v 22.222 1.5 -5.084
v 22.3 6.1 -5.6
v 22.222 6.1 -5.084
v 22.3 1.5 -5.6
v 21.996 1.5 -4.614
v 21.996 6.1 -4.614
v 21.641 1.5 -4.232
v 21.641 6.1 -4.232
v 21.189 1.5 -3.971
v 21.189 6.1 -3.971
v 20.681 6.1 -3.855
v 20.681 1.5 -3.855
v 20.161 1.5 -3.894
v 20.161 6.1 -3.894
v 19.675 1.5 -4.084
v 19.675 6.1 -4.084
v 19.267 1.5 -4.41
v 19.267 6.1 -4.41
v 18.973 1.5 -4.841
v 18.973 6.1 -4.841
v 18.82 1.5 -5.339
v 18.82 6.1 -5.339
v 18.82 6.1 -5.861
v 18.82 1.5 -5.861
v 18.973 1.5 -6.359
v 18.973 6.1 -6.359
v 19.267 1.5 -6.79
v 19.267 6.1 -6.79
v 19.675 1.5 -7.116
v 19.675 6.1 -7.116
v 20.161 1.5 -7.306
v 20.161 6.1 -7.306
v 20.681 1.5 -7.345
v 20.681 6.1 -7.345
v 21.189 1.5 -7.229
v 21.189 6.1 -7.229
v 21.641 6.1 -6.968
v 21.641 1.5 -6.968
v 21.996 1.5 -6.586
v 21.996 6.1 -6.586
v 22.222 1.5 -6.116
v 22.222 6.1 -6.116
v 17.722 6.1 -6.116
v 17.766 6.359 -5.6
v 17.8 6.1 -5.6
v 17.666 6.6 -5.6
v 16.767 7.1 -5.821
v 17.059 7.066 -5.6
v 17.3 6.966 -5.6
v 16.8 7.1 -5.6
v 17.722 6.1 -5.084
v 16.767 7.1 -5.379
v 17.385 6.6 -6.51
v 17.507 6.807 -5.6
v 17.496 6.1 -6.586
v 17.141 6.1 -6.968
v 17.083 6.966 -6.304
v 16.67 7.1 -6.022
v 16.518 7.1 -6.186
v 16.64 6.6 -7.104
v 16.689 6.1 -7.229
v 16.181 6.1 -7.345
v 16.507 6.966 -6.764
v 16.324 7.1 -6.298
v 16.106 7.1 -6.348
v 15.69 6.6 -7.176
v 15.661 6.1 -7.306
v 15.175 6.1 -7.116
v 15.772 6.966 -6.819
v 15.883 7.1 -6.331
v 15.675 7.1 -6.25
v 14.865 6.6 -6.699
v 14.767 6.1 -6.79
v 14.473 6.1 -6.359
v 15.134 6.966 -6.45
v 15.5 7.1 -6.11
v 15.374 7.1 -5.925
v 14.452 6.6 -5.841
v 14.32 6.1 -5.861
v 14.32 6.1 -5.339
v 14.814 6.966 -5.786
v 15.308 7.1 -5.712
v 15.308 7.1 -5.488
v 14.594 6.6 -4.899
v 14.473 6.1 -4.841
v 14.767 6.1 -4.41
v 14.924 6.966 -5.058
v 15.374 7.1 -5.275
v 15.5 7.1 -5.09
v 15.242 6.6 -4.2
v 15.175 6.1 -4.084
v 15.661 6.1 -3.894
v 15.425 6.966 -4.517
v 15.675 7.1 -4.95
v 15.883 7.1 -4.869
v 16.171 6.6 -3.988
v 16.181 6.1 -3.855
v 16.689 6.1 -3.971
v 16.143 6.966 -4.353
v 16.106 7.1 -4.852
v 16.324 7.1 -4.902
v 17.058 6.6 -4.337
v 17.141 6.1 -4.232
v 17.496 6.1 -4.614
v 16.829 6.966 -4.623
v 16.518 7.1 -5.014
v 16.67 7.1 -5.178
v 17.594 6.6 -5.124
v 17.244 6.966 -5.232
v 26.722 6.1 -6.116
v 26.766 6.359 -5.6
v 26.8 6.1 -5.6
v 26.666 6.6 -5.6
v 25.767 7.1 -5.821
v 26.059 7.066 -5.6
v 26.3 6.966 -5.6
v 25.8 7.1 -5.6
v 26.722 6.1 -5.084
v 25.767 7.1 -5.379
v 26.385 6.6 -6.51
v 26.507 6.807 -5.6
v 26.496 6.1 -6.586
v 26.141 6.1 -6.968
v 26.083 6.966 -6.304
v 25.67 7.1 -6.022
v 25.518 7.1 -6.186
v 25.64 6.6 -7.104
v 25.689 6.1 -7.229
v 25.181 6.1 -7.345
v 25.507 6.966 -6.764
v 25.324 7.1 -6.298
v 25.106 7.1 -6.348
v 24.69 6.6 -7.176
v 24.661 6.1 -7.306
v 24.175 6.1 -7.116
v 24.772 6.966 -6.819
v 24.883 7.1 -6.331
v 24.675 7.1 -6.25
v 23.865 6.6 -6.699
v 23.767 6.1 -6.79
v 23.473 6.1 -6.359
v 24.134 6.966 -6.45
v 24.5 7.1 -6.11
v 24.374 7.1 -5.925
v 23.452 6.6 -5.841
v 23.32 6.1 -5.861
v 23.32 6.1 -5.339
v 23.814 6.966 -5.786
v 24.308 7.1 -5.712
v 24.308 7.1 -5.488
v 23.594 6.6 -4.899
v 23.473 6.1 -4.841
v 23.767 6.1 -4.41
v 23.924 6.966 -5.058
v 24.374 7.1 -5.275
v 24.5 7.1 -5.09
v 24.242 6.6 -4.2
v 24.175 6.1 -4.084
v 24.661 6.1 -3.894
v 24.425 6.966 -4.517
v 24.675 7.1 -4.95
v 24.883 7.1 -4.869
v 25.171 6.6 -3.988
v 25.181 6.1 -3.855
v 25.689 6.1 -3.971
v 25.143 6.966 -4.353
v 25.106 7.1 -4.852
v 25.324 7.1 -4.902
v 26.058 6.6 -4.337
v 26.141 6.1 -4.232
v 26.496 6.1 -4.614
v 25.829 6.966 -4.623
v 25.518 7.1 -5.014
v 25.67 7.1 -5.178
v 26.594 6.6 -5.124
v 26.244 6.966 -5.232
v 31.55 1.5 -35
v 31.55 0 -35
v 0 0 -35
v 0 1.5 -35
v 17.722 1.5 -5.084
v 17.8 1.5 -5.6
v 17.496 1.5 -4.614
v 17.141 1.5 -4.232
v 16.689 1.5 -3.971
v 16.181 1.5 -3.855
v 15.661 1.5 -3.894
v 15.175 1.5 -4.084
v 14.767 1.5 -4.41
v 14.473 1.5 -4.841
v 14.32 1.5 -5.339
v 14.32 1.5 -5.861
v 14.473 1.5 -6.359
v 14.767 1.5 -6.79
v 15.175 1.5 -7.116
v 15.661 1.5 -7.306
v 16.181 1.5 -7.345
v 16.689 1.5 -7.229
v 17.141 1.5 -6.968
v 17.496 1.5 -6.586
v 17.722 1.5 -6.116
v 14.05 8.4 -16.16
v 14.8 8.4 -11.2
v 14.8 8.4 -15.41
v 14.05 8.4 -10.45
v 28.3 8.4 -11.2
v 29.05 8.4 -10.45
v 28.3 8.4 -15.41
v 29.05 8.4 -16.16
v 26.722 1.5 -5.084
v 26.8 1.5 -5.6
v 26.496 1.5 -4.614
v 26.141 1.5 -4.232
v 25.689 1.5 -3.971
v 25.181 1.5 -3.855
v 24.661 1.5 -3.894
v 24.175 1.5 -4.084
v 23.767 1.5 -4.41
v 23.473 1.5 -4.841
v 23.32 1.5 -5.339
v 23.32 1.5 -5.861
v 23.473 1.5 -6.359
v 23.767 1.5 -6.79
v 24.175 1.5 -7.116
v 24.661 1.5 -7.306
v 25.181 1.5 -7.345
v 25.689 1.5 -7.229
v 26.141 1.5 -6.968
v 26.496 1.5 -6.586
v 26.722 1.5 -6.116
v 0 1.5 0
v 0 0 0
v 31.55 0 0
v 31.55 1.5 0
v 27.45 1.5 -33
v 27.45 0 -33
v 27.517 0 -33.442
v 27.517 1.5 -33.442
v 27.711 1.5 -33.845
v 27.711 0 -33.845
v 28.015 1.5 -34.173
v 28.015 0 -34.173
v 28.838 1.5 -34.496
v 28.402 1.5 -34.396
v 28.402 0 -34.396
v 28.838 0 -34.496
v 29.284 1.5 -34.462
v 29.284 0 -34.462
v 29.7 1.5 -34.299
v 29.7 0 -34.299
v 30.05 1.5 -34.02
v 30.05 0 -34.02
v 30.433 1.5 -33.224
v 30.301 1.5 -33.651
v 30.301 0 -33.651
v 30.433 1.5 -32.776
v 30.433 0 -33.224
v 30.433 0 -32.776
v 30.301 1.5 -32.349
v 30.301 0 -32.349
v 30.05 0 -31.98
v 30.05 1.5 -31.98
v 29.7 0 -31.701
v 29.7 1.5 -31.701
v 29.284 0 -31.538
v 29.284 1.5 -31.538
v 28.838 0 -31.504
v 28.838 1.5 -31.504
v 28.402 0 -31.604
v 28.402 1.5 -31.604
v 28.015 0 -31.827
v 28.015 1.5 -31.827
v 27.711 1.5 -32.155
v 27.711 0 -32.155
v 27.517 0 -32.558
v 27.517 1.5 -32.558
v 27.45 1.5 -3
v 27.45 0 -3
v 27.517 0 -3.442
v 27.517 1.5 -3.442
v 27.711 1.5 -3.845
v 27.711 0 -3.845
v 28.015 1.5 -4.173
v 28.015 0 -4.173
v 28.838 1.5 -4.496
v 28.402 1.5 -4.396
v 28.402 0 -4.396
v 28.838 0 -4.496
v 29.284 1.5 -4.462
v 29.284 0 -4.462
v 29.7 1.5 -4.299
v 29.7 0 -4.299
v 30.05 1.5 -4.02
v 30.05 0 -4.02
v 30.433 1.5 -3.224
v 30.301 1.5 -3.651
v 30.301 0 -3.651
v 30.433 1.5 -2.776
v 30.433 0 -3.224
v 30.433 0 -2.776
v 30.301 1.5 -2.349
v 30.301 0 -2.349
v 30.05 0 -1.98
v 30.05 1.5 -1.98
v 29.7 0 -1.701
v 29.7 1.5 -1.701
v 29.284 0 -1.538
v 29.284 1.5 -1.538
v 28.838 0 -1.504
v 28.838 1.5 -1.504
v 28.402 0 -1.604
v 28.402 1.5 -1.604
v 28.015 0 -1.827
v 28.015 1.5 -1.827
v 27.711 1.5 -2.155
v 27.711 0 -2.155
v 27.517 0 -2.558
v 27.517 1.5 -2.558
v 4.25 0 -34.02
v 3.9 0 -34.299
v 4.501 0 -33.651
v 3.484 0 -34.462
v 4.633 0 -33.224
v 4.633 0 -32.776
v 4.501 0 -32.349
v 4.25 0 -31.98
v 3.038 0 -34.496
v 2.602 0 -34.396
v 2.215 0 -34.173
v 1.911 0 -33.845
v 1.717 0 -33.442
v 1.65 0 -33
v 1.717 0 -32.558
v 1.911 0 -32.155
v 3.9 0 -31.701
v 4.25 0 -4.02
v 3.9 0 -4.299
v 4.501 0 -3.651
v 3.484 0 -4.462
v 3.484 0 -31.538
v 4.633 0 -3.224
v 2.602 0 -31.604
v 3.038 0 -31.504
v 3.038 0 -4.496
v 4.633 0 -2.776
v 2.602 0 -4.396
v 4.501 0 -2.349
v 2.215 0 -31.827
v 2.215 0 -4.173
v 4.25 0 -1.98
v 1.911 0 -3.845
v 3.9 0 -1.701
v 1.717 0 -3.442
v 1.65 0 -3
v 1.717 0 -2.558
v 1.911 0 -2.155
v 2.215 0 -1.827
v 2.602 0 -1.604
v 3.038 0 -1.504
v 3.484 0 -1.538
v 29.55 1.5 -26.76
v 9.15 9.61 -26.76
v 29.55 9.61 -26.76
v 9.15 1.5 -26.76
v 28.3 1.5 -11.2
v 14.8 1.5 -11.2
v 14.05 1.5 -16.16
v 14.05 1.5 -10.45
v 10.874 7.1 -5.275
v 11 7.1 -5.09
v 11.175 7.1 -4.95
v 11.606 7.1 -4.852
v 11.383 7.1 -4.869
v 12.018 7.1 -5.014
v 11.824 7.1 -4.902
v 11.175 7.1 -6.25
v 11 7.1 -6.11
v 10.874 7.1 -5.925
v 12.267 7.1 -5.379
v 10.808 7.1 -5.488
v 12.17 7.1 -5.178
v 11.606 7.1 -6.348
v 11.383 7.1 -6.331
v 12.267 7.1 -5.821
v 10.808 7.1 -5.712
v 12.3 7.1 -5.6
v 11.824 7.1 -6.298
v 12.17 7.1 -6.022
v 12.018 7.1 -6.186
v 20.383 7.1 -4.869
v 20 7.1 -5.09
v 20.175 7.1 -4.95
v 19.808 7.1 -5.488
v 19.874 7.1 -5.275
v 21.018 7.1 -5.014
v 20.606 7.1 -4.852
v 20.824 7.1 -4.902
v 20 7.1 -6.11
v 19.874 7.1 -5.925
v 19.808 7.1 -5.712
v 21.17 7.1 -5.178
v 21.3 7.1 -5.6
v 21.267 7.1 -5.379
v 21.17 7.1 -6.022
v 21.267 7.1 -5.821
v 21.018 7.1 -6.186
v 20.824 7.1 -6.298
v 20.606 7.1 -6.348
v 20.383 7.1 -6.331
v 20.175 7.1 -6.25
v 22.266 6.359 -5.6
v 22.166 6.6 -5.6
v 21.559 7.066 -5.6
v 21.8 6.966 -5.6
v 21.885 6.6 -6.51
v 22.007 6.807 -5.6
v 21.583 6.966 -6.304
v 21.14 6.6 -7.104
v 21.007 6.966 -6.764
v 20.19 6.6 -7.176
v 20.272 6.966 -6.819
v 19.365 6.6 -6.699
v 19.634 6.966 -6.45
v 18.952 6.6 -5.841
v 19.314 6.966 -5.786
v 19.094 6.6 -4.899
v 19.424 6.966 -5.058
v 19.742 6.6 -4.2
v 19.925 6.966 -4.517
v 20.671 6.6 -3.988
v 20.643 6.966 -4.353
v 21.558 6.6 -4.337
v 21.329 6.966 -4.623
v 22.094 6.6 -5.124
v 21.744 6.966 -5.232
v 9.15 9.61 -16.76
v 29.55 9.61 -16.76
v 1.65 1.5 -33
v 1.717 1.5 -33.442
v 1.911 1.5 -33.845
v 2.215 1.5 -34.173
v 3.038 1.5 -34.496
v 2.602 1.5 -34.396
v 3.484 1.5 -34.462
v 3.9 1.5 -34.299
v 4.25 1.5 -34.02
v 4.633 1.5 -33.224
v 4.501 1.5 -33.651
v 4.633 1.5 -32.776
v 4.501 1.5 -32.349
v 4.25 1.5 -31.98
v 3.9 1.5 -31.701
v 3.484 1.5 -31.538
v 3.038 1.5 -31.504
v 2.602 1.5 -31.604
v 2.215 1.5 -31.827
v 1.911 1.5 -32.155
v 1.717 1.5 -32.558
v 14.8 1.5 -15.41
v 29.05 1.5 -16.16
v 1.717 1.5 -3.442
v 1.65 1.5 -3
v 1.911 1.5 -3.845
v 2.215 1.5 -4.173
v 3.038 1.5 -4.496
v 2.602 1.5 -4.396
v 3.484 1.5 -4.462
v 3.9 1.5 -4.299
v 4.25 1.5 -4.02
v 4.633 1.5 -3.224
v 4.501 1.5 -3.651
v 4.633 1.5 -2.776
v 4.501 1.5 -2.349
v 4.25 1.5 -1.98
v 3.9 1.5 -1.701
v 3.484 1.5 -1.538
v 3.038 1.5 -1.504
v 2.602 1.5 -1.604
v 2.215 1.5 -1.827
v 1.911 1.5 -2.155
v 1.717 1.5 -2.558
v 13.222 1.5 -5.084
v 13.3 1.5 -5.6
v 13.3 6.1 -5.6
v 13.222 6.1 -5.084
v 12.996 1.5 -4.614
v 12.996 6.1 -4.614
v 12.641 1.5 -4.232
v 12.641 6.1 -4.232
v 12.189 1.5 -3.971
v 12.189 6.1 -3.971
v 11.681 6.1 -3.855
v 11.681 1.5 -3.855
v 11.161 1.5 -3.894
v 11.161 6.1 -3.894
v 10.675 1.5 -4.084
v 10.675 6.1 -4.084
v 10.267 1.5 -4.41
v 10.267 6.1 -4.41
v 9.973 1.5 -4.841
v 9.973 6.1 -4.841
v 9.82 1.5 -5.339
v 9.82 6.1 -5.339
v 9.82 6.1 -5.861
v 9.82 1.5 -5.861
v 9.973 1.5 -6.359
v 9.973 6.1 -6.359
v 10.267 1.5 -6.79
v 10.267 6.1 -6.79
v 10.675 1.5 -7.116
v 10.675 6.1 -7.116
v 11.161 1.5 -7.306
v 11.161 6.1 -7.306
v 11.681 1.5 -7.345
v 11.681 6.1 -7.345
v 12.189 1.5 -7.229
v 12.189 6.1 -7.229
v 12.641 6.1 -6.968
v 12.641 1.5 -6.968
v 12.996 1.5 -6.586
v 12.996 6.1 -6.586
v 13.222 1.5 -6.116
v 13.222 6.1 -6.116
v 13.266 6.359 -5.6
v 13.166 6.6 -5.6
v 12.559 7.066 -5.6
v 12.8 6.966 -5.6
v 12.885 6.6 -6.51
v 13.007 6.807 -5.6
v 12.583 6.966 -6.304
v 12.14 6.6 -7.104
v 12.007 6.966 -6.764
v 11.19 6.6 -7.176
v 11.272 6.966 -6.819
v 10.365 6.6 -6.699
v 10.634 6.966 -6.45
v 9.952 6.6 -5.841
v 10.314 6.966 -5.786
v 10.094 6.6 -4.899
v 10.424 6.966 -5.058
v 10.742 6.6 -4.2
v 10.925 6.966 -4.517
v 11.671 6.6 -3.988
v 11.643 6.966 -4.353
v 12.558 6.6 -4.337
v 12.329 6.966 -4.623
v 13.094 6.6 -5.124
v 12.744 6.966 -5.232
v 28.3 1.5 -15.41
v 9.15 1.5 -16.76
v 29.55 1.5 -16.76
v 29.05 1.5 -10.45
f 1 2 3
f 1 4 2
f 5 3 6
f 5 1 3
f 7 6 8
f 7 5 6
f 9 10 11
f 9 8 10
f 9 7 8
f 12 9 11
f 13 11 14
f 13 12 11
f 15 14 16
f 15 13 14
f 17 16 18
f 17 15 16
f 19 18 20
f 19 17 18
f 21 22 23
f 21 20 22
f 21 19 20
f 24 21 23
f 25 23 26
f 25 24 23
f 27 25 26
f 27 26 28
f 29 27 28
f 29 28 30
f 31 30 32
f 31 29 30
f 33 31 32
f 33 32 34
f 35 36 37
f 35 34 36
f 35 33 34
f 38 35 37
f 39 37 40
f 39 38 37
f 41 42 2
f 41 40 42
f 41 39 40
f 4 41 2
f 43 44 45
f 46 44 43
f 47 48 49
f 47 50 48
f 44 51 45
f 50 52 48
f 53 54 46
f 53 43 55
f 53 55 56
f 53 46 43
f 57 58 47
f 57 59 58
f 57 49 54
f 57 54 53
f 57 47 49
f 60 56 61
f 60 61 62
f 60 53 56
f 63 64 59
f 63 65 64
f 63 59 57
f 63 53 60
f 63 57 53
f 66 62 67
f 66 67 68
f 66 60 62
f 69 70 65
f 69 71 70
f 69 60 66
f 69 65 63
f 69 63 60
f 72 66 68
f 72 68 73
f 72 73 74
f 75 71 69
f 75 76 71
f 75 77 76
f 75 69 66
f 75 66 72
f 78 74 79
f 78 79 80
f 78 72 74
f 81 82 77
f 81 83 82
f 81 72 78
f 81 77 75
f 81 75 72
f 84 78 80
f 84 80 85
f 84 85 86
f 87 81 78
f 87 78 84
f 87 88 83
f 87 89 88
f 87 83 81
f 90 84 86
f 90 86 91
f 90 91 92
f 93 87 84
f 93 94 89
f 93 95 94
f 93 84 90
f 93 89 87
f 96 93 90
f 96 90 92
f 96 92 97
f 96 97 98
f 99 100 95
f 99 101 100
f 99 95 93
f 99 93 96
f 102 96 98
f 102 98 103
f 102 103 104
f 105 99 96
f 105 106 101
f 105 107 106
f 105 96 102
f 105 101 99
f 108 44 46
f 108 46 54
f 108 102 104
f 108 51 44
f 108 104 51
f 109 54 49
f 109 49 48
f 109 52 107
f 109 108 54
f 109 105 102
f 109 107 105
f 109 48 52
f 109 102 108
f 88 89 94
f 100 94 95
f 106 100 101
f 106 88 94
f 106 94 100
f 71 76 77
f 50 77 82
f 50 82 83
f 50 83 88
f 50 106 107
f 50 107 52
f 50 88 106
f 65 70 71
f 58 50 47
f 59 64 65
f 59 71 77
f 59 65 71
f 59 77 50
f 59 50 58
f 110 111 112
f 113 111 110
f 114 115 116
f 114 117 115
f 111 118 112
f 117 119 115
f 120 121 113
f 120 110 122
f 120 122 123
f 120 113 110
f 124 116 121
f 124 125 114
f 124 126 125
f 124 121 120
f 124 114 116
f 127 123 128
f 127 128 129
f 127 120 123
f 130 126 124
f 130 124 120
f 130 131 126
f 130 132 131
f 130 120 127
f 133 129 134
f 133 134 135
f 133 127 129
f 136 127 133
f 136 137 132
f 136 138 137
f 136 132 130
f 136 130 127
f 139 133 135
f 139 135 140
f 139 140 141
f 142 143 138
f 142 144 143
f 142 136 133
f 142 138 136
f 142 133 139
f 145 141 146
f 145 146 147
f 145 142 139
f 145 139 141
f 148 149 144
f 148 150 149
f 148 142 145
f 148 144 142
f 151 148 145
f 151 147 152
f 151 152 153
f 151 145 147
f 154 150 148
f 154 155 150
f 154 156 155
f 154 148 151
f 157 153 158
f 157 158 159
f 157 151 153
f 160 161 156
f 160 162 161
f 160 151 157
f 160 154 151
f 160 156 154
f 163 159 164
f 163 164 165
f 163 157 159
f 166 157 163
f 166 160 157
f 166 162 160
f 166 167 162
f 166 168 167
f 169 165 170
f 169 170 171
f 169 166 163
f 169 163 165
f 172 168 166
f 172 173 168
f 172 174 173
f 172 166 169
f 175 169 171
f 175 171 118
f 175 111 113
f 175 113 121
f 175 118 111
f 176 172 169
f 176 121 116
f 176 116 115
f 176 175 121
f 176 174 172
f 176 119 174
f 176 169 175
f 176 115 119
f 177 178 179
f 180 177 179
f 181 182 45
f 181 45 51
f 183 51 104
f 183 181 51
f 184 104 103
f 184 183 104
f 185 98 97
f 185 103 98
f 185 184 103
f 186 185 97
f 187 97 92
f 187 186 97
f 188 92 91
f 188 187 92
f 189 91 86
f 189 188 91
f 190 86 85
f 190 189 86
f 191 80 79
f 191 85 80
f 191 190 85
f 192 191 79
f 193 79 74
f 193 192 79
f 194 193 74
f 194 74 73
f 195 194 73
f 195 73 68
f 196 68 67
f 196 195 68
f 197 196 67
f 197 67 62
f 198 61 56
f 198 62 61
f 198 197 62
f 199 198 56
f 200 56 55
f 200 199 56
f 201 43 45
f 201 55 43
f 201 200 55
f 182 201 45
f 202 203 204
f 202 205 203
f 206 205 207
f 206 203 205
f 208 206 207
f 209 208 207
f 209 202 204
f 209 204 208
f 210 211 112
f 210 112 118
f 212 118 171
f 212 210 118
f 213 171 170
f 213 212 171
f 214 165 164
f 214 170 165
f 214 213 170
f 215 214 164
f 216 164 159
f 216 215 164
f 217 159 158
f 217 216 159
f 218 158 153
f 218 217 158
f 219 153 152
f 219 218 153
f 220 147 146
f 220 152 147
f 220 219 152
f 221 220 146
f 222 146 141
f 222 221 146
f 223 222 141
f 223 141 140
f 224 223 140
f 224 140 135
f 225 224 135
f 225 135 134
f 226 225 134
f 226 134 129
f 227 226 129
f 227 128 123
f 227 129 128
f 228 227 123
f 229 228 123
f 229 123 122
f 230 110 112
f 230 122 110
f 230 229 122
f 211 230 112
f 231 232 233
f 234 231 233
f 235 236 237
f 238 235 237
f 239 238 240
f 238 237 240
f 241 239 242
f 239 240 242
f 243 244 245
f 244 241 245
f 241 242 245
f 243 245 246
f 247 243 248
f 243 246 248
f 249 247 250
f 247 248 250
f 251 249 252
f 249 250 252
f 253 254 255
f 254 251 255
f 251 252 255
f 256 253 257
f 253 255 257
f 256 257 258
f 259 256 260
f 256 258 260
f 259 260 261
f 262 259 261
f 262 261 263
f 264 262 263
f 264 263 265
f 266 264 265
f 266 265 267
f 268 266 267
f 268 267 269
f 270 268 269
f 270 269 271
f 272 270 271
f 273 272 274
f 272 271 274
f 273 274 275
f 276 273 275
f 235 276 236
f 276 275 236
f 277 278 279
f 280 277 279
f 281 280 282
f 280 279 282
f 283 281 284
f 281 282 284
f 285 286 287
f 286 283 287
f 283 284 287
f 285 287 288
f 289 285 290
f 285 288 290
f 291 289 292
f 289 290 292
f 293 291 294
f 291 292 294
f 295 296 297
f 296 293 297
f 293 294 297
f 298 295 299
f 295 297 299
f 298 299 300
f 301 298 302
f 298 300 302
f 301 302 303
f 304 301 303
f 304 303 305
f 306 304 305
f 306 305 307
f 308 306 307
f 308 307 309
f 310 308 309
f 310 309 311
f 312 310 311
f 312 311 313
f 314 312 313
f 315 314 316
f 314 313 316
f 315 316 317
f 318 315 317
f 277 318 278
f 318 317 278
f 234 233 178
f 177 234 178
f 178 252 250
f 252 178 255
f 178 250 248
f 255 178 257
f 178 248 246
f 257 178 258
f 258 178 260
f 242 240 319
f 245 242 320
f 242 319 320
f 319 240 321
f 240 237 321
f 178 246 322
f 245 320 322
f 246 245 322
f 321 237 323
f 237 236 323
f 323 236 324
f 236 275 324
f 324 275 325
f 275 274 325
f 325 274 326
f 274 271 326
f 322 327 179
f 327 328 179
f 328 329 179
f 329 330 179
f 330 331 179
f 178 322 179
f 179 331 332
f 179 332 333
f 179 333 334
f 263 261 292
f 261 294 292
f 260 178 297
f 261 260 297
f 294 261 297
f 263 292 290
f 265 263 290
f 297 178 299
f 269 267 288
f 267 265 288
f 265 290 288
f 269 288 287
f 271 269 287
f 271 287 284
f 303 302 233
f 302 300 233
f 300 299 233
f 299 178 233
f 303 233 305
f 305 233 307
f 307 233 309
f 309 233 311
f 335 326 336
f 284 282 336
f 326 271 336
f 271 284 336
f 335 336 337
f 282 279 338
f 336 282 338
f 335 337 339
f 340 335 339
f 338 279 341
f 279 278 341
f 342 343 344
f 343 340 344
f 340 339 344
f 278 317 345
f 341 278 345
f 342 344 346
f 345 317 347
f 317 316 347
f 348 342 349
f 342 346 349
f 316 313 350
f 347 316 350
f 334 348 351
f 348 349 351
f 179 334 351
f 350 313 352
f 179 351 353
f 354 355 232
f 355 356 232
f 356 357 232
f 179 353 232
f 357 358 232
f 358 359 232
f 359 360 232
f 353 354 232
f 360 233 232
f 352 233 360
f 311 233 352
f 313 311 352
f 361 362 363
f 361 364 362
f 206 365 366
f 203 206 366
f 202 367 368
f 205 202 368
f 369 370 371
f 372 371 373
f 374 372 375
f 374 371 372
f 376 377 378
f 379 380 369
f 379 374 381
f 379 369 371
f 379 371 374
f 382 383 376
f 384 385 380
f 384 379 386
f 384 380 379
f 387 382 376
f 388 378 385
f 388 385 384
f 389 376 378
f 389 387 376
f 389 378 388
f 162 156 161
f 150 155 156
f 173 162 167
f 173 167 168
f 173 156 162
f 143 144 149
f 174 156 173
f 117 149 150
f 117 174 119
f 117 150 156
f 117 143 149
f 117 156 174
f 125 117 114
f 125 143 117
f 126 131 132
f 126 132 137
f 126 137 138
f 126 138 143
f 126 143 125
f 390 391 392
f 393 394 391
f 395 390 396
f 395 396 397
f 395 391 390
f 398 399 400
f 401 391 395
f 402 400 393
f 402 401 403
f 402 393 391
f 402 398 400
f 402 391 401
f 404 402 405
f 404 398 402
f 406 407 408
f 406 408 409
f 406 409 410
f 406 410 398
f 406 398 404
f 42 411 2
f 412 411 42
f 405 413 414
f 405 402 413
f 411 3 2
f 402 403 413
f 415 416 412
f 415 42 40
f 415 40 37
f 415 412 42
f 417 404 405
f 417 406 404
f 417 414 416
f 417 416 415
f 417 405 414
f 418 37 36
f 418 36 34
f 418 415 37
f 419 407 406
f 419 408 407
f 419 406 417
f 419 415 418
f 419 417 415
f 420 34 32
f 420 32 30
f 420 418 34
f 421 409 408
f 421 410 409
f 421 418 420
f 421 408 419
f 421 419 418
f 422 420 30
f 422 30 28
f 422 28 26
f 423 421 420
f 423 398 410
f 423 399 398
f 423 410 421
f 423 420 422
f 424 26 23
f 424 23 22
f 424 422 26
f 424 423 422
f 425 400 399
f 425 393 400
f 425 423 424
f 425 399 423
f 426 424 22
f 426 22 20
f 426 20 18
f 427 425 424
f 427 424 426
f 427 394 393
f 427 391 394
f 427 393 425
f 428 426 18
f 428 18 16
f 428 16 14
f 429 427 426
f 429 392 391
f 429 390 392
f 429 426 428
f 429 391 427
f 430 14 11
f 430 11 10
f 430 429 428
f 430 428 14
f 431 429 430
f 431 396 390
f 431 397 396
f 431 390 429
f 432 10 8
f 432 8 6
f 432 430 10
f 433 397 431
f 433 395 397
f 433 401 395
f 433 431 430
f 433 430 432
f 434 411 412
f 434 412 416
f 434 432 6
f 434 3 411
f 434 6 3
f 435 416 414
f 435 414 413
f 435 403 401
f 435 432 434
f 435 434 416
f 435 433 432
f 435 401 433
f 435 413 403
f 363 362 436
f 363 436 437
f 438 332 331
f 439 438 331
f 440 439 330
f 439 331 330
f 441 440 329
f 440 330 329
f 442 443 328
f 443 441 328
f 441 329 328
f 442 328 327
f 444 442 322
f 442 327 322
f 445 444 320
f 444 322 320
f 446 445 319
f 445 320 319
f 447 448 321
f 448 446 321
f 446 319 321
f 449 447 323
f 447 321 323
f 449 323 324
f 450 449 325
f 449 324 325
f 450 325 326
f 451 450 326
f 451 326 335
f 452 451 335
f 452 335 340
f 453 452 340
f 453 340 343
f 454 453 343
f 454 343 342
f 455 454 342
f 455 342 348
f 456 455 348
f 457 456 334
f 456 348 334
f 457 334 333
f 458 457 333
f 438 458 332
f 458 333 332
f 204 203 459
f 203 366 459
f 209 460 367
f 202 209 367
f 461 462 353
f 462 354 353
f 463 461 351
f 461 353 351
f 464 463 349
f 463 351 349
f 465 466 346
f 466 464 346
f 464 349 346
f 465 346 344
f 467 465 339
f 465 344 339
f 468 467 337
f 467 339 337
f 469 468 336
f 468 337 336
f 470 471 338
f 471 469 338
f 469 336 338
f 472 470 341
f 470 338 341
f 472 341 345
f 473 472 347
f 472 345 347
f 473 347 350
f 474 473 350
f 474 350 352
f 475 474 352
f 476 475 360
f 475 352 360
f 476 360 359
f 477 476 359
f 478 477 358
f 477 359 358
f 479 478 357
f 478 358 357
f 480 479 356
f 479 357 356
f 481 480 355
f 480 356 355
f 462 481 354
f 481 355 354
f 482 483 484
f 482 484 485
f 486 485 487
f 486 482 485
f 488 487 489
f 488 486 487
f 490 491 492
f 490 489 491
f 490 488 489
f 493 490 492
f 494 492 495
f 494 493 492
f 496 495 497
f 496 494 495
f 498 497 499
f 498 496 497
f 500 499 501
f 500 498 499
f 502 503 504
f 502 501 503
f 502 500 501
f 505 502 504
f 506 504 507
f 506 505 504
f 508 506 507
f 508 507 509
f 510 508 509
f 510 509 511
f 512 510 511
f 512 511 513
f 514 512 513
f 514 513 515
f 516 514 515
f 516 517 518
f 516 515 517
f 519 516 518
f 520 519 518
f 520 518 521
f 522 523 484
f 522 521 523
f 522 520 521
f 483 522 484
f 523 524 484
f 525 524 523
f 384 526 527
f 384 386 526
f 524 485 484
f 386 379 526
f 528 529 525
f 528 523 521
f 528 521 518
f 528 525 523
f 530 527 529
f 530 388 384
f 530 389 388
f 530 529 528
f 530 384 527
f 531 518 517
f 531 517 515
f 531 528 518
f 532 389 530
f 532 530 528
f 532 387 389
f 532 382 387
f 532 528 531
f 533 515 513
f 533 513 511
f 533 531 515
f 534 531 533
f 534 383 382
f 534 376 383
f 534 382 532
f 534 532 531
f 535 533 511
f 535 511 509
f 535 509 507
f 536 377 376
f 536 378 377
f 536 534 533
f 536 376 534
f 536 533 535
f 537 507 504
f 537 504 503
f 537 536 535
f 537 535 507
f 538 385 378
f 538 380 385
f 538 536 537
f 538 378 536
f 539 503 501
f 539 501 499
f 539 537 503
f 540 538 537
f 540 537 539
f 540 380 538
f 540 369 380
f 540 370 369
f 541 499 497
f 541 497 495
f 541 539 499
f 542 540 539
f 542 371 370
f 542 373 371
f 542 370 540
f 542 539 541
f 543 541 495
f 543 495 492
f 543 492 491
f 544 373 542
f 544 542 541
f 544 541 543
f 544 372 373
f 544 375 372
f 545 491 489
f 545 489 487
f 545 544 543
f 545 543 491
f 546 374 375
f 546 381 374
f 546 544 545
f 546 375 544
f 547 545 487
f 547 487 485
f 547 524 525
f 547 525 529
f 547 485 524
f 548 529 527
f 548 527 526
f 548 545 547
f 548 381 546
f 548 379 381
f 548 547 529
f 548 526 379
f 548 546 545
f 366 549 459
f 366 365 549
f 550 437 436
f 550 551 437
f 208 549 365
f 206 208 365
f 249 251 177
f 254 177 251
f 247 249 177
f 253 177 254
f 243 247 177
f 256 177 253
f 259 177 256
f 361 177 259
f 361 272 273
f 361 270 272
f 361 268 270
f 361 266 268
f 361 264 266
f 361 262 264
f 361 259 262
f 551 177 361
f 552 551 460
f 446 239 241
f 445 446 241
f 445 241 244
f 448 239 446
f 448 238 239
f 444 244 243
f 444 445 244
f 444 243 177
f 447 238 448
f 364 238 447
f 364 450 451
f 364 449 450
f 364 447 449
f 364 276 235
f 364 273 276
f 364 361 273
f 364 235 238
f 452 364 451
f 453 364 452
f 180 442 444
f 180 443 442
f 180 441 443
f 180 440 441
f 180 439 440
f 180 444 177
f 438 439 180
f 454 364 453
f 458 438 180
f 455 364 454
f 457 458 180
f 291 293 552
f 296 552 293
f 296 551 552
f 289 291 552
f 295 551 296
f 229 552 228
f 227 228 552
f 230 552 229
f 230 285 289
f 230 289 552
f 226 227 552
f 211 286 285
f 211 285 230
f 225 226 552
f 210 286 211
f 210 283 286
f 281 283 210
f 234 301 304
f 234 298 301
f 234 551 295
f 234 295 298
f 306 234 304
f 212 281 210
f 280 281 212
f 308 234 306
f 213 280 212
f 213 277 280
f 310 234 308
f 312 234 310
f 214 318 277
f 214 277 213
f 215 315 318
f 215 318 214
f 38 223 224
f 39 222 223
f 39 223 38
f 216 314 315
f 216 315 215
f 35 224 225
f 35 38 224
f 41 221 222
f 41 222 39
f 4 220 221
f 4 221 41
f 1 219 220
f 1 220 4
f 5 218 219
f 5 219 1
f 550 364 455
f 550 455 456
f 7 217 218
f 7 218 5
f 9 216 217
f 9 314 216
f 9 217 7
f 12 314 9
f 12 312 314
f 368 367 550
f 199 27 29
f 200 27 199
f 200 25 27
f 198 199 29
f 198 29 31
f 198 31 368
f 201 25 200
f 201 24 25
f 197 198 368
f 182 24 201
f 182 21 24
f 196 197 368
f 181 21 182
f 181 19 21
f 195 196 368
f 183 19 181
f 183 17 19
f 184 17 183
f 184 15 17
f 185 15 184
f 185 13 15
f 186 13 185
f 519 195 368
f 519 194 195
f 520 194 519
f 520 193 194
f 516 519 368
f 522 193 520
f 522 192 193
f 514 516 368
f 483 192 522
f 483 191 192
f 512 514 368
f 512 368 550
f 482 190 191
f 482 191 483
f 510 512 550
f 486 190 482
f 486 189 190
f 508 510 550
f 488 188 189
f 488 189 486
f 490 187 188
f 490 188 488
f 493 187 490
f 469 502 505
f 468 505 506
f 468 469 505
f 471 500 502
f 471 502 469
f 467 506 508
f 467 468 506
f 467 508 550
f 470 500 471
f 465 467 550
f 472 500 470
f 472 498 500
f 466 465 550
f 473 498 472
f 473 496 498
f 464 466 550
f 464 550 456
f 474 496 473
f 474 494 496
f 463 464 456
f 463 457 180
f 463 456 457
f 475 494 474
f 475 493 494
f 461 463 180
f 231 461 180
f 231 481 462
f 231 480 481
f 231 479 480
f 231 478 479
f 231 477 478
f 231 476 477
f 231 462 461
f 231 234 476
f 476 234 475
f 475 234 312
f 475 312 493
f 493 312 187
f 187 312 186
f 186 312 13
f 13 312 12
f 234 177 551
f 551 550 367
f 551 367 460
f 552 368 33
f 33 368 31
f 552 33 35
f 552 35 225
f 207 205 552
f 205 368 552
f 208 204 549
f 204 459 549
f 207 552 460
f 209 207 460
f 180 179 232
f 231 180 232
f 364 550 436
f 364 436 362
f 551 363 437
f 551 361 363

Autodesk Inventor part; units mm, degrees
ref_plane "YZ Plane" through (0, 0, 0) normal (1, 0, 0) x (0, 1, 0)
ref_plane "XZ Plane" through (0, 0, 0) normal (0, 1, 0) x (-1, 0, 0)
ref_plane "XY Plane" through (0, 0, 0) normal (0, 0, 1) x (1, 0, 0)
sketch "Sketch1" plane through (0, 0, 0) normal (0, 1, 0) x (-1, 0, 0)
  line L0 (0, 0) -> (-31.55, 0)
  line L1 (-31.55, 0) -> (-31.55, -35)
  line L2 (-31.55, -35) -> (0, -35)
  line L3 (0, -35) -> (0, 0)
  circle A0 centre (-3.15, -33) radius 1.5
  circle A1 centre (-28.95, -33) radius 1.5
  circle A2 centre (-3.15, -3) radius 1.5
  circle A3 centre (-28.95, -3) radius 1.5
  dimension "d0" = 31.55
  dimension "d1" = 35
  dimension "d2" = 3
  dimension "d3" = 25.8
  dimension "d4" = 2.6
  dimension "d5" = 30
  dimension "d6" = 2
extrude "Extrusion1" add sketch "Sketch1" along normal blind 1.5
sketch "Sketch2" plane through (0, 1.5, 0) normal (0, 1, 0) x (1, 0, 0)
  line L0 (9.15, 26.76) -> (29.55, 26.76)
  line L1 (29.55, 26.76) -> (29.55, 16.76)
  line L2 (29.55, 16.76) -> (9.15, 16.76)
  line L3 (9.15, 16.76) -> (9.15, 26.76)
  line L4 (31.55, 35) -> (0, 35) projected
  line L5 (29.05, 16.16) -> (14.05, 16.16)
  line L6 (14.05, 16.16) -> (14.05, 10.45)
  line L7 (14.05, 10.45) -> (29.05, 10.45)
  line L8 (29.05, 10.45) -> (29.05, 16.16)
  line L9 (28.3, 11.2) -> (14.8, 11.2)
  line L10 (14.8, 11.2) -> (14.8, 15.41)
  line L11 (14.8, 15.41) -> (28.3, 15.41)
  line L12 (28.3, 15.41) -> (28.3, 11.2)
  line L13 (31.55, 0) -> (31.55, 35) projected
  circle A0 centre (11.55, 5.6) radius 1.75
  circle A1 centre (16.05, 5.6) radius 1.75
  circle A2 centre (20.55, 5.6) radius 1.75
  circle A3 centre (25.05, 5.6) radius 1.75
  line L14 (0, 0) -> (31.55, 0) projected
  dimension "d9" = 10
  dimension "d10" = 20.4
  dimension "d11" = 8.24
  dimension "d12" = 2
  dimension "d15" = 15
  dimension "d16" = 5.71
  dimension "d17" = 2.5
  dimension "d18" = 10.45
  dimension "d19" = 0.75
  dimension "d22" = 4.5
  dimension "d23" = 4.5
  dimension "d24" = 4.5
  dimension "d25" = 6.5
  dimension "d26" = 5.6
  dimension "d27" = 3.5
extrude "Extrusion2" add sketch "Sketch2" along normal blind 8.11 contours L0 L1 L2 L3
extrude "Extrusion3" add sketch "Sketch2" along normal blind 6.9 contours L8 L7 L6 L5
extrude "Extrusion4" add sketch "Sketch2" along normal blind 5.6 contours A0 | A1 | A2 | A3
fillet "Fillet1" radius 1 4 edges at (9.8, 7.1, -5.6) (14.3, 7.1, -5.6) (18.8, 7.1, -5.6) (23.3, 7.1, -5.6)
properties part number "STEPPER DRIVER"
